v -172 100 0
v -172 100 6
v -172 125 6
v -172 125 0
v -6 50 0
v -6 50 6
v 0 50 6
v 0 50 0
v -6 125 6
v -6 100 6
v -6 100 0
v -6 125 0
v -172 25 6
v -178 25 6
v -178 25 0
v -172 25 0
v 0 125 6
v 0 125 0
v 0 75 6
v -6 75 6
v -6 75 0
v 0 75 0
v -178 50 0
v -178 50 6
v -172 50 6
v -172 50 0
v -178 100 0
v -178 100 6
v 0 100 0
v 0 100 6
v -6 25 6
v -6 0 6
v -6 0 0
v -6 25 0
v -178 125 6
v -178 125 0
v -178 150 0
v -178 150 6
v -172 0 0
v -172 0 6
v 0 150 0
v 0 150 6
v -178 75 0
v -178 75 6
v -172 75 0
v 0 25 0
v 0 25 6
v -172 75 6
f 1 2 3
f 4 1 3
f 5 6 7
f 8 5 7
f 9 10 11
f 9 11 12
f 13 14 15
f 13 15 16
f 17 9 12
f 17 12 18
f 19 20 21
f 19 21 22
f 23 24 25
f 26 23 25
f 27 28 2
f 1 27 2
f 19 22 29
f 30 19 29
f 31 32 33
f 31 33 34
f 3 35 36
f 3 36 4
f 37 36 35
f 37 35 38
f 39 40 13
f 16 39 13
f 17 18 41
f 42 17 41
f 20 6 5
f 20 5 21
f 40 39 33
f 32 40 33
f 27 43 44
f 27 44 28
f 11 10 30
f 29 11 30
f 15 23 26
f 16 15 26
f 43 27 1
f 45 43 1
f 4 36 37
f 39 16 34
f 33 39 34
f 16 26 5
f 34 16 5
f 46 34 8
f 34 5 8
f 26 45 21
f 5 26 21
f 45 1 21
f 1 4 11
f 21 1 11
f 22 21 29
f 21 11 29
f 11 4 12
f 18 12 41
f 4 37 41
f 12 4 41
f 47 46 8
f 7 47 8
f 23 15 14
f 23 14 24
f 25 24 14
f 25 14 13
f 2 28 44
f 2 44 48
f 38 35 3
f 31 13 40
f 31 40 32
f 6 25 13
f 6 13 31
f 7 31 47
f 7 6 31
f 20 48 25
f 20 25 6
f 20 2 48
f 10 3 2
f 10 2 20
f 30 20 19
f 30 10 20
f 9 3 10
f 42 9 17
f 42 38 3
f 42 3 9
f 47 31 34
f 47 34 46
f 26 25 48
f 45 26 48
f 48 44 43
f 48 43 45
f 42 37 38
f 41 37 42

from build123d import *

# Parameters (mm, degrees)
SKETCH1_W            = 178
SKETCH1_H            = 150
BOSS_EXTRUDE1_DEPTH  = 6
SKETCH2_W            = 6
SKETCH2_H            = 25
CUT_EXTRUDE1_DEPTH   = 6
LPATTERN1_COUNT      = 3
LPATTERN1_PITCH      = 50
LPATTERN1_COUNT_DIR2 = 2
LPATTERN1_PITCH_DIR2 = 172


with BuildPart() as part:
    # Sketch1 → Boss-Extrude1 (new body)
    with BuildSketch(Plane.XY):
        with Locations((-89, 75)):
            Rectangle(SKETCH1_W, SKETCH1_H)
    extrude(amount=BOSS_EXTRUDE1_DEPTH)

    # Sketch2 → Cut-Extrude1 (cut)
    with BuildSketch(Plane.XY.offset(6)):
        with Locations((-175, 112.5)):
            Rectangle(SKETCH2_W, SKETCH2_H)
    cut_extrude1 = extrude(amount=-CUT_EXTRUDE1_DEPTH, mode=Mode.SUBTRACT)

    # LPattern1: Cut-Extrude1 3 × 2
    with Locations(*[(j * LPATTERN1_PITCH_DIR2, -i * LPATTERN1_PITCH, 0) for i in range(LPATTERN1_COUNT) for j in range(LPATTERN1_COUNT_DIR2) if (i, j) != (0, 0)]):
        add(cut_extrude1, mode=Mode.SUBTRACT)


solid = part.part
